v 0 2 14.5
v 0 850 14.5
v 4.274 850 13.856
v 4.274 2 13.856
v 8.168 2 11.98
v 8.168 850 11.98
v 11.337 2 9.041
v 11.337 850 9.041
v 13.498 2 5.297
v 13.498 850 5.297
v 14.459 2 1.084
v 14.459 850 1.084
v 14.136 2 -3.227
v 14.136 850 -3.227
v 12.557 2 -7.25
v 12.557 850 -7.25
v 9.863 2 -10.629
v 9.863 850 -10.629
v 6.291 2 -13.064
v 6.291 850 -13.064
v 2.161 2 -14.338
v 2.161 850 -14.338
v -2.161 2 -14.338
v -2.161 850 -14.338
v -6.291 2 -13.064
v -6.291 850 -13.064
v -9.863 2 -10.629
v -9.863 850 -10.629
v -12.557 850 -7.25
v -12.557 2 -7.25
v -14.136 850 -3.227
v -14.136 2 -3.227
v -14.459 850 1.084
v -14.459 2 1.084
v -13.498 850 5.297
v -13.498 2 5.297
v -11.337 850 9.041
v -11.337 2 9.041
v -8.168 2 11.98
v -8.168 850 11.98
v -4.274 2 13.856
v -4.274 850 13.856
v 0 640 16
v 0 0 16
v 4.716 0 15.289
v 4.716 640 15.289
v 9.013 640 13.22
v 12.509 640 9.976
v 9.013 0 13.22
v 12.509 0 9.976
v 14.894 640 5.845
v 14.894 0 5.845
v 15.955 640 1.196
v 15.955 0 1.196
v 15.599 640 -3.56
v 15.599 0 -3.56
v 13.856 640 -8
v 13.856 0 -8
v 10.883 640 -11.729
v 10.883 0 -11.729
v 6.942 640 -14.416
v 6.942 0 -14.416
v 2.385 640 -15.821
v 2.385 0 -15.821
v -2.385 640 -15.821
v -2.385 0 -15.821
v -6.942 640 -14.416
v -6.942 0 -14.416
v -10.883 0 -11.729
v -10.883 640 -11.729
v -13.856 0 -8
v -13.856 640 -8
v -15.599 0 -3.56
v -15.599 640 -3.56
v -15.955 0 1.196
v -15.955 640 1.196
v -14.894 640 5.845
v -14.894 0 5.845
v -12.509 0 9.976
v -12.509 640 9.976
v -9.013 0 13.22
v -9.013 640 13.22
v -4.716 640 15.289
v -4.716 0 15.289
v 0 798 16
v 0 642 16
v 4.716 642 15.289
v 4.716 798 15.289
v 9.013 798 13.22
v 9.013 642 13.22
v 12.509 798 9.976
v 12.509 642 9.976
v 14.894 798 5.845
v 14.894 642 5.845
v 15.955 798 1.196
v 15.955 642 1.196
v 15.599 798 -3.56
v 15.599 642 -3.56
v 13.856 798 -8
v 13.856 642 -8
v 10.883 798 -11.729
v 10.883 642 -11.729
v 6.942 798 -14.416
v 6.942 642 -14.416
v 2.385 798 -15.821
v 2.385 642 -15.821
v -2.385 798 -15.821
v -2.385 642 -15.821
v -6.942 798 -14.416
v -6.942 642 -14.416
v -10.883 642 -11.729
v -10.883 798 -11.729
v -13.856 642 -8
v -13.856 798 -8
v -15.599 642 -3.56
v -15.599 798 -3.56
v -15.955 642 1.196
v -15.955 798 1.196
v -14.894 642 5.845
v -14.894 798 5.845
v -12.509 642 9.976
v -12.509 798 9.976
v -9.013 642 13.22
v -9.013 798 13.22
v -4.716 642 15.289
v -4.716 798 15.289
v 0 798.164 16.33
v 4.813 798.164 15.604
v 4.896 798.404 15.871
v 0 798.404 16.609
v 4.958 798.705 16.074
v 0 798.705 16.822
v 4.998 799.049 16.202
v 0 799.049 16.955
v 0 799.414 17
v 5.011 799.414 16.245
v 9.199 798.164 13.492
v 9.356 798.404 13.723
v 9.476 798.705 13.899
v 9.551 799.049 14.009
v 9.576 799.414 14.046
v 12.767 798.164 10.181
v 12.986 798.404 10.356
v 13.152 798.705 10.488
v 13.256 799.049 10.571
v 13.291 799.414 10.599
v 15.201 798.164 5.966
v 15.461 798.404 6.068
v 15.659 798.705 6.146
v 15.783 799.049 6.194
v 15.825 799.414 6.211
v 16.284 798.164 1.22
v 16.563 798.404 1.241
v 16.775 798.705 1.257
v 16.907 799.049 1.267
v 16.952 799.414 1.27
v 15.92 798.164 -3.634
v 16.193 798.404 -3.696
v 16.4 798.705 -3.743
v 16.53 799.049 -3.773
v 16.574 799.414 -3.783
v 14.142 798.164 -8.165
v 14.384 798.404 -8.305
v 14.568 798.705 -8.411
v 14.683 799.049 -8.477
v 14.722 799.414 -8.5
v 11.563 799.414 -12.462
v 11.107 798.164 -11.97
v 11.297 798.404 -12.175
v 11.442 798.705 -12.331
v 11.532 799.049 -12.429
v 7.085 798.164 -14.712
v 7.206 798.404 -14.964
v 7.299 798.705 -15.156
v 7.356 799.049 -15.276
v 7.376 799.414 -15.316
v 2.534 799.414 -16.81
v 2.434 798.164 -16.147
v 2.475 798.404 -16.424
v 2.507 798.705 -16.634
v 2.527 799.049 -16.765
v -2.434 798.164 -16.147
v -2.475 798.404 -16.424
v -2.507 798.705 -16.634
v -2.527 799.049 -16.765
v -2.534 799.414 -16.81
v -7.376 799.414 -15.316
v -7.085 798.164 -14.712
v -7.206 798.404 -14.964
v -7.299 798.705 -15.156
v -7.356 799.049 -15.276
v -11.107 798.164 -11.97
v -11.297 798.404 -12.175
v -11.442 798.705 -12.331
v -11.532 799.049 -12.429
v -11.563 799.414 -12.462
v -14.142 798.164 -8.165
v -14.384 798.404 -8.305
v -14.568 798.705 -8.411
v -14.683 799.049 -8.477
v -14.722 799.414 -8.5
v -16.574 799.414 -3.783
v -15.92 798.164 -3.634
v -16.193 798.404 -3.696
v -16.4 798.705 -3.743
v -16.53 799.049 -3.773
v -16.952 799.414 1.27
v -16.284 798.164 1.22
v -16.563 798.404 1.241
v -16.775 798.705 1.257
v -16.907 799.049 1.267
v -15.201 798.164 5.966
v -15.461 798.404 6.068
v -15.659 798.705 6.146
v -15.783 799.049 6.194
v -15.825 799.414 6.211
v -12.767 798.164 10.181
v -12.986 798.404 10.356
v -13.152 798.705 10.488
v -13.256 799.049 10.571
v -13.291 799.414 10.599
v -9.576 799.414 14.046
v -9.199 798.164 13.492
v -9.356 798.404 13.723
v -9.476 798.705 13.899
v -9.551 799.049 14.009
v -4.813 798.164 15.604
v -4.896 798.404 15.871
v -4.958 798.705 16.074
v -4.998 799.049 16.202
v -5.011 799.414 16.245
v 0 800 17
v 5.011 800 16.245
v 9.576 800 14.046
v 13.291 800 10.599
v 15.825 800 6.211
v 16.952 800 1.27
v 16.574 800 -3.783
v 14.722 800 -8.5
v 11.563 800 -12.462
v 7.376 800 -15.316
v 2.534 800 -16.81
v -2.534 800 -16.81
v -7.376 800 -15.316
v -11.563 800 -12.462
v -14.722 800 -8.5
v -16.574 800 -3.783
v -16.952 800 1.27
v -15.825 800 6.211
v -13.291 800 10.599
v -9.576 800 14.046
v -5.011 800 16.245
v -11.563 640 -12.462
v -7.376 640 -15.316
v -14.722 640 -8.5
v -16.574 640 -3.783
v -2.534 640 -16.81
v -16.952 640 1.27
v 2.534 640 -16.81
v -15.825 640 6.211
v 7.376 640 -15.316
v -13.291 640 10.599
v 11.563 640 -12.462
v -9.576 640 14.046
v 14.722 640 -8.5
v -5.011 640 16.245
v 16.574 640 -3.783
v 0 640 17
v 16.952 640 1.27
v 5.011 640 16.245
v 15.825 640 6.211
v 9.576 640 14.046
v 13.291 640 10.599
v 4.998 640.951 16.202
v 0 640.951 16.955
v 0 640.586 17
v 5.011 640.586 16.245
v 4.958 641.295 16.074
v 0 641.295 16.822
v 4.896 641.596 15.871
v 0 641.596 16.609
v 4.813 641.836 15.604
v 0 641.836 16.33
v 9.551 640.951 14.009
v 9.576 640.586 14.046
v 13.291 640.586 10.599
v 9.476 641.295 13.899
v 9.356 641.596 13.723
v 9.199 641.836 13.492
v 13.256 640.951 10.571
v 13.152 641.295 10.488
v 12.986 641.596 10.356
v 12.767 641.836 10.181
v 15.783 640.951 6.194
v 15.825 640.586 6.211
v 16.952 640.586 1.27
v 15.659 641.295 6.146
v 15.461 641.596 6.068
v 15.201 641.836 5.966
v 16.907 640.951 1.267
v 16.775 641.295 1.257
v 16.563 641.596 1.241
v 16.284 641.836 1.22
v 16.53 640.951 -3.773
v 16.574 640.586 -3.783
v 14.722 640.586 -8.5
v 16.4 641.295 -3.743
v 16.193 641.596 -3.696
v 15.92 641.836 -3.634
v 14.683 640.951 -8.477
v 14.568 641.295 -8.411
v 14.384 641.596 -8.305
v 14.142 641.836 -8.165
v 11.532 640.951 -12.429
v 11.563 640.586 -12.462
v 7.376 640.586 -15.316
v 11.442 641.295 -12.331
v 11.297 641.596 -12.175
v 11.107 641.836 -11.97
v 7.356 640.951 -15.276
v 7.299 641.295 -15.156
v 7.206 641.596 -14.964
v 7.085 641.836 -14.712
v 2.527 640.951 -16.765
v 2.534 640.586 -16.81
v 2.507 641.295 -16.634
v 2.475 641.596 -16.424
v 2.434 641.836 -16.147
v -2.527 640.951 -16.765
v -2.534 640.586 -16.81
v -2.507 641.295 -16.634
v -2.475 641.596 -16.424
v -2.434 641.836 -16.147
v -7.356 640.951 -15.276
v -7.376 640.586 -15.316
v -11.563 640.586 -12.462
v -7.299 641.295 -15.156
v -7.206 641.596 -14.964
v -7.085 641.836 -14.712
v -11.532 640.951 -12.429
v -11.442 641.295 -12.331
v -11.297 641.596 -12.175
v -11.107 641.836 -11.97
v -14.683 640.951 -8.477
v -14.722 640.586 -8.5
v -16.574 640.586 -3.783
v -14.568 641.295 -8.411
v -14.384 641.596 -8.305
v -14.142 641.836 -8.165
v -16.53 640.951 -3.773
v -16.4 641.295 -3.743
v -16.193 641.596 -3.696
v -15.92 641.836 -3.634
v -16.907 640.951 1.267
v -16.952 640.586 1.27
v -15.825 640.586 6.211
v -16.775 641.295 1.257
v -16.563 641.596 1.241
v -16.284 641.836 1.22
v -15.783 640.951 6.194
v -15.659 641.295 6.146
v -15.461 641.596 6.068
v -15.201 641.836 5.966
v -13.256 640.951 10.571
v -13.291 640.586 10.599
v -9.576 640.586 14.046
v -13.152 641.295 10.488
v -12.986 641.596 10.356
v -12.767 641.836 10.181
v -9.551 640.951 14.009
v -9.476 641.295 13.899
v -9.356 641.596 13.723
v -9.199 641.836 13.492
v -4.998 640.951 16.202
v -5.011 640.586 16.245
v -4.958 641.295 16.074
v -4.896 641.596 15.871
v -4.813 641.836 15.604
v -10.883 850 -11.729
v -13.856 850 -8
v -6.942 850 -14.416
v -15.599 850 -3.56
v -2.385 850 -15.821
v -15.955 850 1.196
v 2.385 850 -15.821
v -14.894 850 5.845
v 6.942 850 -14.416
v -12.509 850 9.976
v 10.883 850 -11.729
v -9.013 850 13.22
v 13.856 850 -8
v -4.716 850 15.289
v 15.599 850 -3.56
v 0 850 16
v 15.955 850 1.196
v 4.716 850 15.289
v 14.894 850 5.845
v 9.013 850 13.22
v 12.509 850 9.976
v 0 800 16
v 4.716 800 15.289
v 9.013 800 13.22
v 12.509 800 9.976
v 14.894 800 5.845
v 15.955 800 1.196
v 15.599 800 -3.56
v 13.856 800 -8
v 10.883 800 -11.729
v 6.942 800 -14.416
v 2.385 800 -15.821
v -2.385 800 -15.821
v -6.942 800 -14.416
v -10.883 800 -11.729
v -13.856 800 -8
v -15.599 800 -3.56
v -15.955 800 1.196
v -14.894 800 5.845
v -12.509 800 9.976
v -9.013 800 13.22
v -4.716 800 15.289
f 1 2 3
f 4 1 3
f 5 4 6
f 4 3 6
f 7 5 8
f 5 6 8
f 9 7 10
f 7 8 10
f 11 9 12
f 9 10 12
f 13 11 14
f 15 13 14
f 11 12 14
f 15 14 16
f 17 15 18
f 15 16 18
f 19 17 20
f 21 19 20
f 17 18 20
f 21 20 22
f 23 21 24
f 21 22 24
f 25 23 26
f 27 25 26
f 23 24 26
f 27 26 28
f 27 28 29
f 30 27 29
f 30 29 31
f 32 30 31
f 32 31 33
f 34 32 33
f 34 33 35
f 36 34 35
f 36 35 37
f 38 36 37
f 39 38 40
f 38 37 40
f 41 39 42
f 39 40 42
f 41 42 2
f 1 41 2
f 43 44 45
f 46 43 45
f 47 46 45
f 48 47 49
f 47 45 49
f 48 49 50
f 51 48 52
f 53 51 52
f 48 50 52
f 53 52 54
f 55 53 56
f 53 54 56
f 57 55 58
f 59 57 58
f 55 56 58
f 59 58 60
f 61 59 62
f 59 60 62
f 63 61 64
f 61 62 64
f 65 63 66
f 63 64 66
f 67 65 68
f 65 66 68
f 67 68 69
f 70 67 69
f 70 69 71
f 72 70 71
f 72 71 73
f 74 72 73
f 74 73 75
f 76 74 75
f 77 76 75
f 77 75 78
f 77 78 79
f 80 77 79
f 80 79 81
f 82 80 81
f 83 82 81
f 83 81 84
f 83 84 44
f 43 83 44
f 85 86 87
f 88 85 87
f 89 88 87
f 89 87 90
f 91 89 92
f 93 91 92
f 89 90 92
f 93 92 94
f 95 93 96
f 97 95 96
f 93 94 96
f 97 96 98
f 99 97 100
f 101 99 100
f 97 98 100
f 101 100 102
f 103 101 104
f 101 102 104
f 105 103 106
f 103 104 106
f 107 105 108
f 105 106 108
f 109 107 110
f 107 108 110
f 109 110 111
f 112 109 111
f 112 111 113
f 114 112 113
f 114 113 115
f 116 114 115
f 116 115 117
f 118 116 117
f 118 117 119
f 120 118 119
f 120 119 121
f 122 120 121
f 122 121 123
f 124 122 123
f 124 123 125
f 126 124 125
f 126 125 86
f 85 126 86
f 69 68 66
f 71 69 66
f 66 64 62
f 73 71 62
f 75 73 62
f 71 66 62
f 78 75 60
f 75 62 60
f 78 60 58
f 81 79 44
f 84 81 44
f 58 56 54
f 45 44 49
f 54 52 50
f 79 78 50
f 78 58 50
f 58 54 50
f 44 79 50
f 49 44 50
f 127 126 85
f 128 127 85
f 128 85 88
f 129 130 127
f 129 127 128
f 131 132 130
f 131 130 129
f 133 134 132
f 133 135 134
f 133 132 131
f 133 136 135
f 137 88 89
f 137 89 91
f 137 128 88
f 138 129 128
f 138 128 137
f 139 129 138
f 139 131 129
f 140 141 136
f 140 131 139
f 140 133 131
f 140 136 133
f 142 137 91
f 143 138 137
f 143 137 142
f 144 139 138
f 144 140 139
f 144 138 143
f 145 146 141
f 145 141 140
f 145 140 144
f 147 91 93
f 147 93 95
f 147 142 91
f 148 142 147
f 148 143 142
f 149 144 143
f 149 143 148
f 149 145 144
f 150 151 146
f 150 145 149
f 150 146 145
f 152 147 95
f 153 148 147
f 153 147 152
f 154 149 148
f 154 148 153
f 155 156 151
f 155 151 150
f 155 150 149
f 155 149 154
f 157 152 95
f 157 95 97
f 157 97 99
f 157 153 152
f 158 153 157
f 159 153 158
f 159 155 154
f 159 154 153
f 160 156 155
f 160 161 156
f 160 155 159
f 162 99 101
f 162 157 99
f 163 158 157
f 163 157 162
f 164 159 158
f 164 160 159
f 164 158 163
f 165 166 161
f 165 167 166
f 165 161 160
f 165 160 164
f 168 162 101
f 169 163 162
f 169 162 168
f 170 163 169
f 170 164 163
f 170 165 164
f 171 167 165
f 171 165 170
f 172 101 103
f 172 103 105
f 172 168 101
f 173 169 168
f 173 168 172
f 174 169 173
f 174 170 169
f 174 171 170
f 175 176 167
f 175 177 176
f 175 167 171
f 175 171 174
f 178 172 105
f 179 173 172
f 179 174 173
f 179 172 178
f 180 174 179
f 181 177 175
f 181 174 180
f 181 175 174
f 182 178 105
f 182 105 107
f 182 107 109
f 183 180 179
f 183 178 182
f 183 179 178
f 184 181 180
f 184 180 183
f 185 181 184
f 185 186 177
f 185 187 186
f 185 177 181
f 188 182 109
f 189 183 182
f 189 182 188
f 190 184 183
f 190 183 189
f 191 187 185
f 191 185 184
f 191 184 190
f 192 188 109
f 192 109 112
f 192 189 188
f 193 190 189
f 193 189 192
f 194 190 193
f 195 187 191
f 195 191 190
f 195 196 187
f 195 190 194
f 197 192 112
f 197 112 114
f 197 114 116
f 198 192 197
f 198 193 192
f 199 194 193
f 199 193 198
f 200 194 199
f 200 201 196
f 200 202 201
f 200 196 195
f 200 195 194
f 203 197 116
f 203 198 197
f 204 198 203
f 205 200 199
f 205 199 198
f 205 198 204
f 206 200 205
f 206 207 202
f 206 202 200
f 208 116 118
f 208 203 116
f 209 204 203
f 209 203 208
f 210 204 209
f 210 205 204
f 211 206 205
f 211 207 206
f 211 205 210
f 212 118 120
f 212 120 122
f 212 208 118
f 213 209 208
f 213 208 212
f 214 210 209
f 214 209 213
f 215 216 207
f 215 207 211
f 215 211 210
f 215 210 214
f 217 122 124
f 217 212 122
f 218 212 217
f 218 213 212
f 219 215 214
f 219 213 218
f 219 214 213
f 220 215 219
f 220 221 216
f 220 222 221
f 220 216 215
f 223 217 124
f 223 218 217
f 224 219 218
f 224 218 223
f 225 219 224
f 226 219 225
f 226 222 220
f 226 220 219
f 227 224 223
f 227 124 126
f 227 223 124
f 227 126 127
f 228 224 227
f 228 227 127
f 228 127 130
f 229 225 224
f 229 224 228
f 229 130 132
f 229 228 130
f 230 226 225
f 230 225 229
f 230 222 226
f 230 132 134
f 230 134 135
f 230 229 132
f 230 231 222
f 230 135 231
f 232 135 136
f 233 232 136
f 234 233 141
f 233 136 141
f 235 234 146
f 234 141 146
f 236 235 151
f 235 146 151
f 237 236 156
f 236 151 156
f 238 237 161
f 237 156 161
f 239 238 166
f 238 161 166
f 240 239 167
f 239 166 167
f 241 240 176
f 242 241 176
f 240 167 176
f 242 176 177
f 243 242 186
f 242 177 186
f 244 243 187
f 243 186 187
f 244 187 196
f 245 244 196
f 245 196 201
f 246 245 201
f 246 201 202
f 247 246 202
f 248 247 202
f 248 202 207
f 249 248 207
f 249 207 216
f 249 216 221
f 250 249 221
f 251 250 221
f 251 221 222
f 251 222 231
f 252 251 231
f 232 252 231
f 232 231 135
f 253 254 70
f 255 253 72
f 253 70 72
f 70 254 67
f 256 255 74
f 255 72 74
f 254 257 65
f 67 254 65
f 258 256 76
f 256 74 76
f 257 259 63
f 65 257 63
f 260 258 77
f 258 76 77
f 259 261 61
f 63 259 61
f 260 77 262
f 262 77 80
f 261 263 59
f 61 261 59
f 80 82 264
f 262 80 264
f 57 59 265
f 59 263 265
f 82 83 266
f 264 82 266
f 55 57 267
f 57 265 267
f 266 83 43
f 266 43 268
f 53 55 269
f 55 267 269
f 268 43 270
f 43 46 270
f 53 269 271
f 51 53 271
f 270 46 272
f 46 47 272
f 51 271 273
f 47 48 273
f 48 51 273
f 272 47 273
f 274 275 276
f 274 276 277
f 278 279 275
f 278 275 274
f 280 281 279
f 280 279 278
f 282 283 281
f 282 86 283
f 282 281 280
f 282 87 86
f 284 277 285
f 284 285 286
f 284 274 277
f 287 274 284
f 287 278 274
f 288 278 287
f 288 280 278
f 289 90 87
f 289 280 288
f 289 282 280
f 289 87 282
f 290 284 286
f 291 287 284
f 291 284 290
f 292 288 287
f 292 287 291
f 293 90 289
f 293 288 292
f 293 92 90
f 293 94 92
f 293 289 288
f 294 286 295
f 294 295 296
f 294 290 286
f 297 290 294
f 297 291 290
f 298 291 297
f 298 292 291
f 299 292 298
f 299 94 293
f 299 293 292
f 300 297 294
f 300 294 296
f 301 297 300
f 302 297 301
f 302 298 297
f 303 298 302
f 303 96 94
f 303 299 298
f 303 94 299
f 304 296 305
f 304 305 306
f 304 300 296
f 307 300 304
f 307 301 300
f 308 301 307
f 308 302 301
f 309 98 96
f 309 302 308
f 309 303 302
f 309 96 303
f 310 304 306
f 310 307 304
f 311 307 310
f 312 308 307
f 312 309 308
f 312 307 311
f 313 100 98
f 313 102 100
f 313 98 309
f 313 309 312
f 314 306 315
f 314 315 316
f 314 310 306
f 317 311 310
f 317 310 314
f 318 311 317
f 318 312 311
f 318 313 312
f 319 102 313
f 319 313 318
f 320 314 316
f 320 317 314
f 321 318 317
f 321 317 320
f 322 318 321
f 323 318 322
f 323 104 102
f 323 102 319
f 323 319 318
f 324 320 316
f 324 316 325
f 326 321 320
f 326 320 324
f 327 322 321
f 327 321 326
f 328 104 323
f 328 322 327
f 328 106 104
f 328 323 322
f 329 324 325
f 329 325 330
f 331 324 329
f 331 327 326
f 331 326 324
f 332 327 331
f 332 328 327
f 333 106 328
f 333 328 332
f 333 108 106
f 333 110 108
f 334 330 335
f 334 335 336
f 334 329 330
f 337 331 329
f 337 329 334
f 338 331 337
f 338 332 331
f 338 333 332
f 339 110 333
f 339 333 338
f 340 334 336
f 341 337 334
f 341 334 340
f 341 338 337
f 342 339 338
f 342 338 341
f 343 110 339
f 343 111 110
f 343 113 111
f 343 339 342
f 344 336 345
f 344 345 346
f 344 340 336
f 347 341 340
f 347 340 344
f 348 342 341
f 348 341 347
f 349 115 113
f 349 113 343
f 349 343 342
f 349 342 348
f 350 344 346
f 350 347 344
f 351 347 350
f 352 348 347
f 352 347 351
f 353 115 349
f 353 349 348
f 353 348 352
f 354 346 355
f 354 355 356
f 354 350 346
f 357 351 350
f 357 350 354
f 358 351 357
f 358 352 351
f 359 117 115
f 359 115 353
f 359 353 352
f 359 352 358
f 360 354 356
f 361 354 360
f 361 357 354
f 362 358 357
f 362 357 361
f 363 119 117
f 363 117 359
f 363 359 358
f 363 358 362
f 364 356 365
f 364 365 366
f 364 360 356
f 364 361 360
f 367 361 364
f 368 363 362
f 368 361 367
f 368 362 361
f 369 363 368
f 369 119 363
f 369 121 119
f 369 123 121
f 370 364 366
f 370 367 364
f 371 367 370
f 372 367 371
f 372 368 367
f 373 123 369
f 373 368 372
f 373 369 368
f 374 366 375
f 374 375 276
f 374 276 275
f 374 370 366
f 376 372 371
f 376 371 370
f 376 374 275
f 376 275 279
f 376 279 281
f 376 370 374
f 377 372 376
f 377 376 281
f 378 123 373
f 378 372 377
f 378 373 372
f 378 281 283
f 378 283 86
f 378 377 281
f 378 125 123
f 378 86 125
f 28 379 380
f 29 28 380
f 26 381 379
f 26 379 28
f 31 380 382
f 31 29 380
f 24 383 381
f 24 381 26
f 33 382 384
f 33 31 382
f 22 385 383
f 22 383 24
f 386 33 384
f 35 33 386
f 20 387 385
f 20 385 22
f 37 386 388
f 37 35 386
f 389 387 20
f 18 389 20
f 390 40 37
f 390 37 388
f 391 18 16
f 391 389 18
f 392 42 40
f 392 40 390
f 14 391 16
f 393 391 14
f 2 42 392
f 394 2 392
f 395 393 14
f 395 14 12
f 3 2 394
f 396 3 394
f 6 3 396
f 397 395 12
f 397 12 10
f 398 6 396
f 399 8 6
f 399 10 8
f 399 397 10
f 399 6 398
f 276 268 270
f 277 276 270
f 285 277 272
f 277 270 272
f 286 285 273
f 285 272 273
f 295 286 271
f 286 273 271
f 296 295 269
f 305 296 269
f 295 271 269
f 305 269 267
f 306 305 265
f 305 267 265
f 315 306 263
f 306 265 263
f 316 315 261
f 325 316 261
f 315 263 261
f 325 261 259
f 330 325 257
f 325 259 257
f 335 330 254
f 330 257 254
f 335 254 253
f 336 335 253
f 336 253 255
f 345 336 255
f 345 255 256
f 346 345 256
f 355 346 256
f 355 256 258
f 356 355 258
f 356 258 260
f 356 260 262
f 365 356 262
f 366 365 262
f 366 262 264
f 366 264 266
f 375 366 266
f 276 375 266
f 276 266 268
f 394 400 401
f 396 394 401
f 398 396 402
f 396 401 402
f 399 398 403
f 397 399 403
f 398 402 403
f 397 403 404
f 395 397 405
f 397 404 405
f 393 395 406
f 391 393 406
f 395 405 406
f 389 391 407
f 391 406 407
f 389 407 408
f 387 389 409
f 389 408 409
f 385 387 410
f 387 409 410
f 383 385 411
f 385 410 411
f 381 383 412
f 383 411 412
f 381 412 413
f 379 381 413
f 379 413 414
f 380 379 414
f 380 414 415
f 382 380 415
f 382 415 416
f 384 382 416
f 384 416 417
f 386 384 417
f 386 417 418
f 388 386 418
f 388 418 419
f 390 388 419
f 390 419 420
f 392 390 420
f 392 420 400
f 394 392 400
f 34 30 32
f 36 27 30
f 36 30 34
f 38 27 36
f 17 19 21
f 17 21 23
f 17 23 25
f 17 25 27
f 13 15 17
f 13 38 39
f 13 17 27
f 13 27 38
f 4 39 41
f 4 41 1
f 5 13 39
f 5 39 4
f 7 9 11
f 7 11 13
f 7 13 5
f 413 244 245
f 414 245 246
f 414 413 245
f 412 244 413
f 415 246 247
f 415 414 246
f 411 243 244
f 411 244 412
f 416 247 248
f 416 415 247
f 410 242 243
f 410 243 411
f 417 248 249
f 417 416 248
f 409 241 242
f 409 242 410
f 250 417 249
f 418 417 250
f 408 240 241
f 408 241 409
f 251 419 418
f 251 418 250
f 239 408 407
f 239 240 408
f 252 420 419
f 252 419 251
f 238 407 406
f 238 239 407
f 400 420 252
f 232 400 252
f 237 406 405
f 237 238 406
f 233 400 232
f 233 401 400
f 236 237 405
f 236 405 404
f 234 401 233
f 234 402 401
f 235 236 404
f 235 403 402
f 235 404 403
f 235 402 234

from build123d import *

# Parameters (mm, degrees)
SKETCH1_R           = 16
BOSS_EXTRUDE1_DEPTH = 850
SKETCH2_R           = 14.5
CUT_EXTRUDE1_DEPTH  = 848
BOSS_EXTRUDE2_START = -2
SKETCH3_R           = 17
SKETCH3_R_2         = 16
BOSS_EXTRUDE2_DEPTH = 2
FILLET1_R           = 1.5
SKETCH4_R           = 17
SKETCH4_R_2         = 16
BOSS_EXTRUDE3_DEPTH = 2
FILLET2_R           = 1.5


with BuildPart() as part:
    # Sketch1 → Boss-Extrude1 (new body)
    with BuildSketch(Plane(origin=(0, 0, 0), x_dir=(1, 0, 0), z_dir=(0, 1, 0))):
        with Locations(Location((0, 0, 0), (0, 0, 270))):
            Circle(SKETCH1_R)
    extrude(amount=BOSS_EXTRUDE1_DEPTH)

    # Sketch2 → Cut-Extrude1 (cut)
    with BuildSketch(Plane(origin=(0, 850, 0), x_dir=(1, 0, 0), z_dir=(0, 1, 0))):
        with Locations(Location((0, 0, 0), (0, 0, 270))):
            Circle(SKETCH2_R)
    extrude(amount=-CUT_EXTRUDE1_DEPTH, mode=Mode.SUBTRACT)

    # Sketch3 → Boss-Extrude2 (add)
    with BuildSketch(Plane(origin=(0, 800, 0), x_dir=(1, 0, 0), z_dir=(0, 1, 0)).offset(BOSS_EXTRUDE2_START)):
        with Locations(Location((0, 0, 0), (0, 0, 270))):
            Circle(SKETCH3_R)
        with Locations(Location((0, 0, 0), (0, 0, 270))):
            Circle(SKETCH3_R_2, mode=Mode.SUBTRACT)
    extrude(amount=BOSS_EXTRUDE2_DEPTH)

    # Fillet1
    # the kernel refuses this fillet: 1.5 mm, written as the material it takes off along each edge
    with BuildSketch(Plane(origin=(0, 798, 0), x_dir=(0, 0, 1), z_dir=(-1, 0, 0))) as fillet1_piece_1:
        with BuildLine():
            CenterArc((15.5, 1.414213562), FILLET1_R, 289.471220634, 70.528779366)
            Line((17, 1.414213562), (17.03, 1.414213562))
            Line((17.03, 1.414213562), (17.03, 0))
            Line((17.03, 0), (17, -0.03))
            ThreePointArc((17, -0.03), (16.5, -0.03), (16.01, -0.028284271))
            Line((16.01, -0.028284271), (16, 0))
        make_face()
    revolve(axis=Axis((0, 798, 0), (0, 1, 0)), mode=Mode.SUBTRACT)

    # Sketch4 → Boss-Extrude3 (add)
    with BuildSketch(Plane(origin=(0, 640, 0), x_dir=(1, 0, 0), z_dir=(0, 1, 0))):
        with Locations(Location((0, 0, 0), (0, 0, 270))):
            Circle(SKETCH4_R)
        with Locations(Location((0, 0, 0), (0, 0, 270))):
            Circle(SKETCH4_R_2, mode=Mode.SUBTRACT)
    extrude(amount=BOSS_EXTRUDE3_DEPTH)

    # Fillet2
    # the kernel refuses this fillet: 1.5 mm, written as the material it takes off along each edge
    with BuildSketch(Plane(origin=(0, 642, 0), x_dir=(0, 0, 1), z_dir=(-1, 0, 0))) as fillet2_piece_1:
        with BuildLine():
            CenterArc((15.5, -1.414213562), FILLET2_R, 0, 70.528779366)
            Line((16, 0), (16.01, 0.028284271))
            ThreePointArc((16.01, 0.028284271), (16.5, 0.03), (17, 0.03))
            Line((17, 0.03), (17.03, 0))
            Line((17.03, 0), (17.03, -1.414213562))
            Line((17.03, -1.414213562), (17, -1.414213562))
        make_face()
    revolve(axis=Axis((0, 642, 0), (0, 1, 0)), mode=Mode.SUBTRACT)


solid = part.part
